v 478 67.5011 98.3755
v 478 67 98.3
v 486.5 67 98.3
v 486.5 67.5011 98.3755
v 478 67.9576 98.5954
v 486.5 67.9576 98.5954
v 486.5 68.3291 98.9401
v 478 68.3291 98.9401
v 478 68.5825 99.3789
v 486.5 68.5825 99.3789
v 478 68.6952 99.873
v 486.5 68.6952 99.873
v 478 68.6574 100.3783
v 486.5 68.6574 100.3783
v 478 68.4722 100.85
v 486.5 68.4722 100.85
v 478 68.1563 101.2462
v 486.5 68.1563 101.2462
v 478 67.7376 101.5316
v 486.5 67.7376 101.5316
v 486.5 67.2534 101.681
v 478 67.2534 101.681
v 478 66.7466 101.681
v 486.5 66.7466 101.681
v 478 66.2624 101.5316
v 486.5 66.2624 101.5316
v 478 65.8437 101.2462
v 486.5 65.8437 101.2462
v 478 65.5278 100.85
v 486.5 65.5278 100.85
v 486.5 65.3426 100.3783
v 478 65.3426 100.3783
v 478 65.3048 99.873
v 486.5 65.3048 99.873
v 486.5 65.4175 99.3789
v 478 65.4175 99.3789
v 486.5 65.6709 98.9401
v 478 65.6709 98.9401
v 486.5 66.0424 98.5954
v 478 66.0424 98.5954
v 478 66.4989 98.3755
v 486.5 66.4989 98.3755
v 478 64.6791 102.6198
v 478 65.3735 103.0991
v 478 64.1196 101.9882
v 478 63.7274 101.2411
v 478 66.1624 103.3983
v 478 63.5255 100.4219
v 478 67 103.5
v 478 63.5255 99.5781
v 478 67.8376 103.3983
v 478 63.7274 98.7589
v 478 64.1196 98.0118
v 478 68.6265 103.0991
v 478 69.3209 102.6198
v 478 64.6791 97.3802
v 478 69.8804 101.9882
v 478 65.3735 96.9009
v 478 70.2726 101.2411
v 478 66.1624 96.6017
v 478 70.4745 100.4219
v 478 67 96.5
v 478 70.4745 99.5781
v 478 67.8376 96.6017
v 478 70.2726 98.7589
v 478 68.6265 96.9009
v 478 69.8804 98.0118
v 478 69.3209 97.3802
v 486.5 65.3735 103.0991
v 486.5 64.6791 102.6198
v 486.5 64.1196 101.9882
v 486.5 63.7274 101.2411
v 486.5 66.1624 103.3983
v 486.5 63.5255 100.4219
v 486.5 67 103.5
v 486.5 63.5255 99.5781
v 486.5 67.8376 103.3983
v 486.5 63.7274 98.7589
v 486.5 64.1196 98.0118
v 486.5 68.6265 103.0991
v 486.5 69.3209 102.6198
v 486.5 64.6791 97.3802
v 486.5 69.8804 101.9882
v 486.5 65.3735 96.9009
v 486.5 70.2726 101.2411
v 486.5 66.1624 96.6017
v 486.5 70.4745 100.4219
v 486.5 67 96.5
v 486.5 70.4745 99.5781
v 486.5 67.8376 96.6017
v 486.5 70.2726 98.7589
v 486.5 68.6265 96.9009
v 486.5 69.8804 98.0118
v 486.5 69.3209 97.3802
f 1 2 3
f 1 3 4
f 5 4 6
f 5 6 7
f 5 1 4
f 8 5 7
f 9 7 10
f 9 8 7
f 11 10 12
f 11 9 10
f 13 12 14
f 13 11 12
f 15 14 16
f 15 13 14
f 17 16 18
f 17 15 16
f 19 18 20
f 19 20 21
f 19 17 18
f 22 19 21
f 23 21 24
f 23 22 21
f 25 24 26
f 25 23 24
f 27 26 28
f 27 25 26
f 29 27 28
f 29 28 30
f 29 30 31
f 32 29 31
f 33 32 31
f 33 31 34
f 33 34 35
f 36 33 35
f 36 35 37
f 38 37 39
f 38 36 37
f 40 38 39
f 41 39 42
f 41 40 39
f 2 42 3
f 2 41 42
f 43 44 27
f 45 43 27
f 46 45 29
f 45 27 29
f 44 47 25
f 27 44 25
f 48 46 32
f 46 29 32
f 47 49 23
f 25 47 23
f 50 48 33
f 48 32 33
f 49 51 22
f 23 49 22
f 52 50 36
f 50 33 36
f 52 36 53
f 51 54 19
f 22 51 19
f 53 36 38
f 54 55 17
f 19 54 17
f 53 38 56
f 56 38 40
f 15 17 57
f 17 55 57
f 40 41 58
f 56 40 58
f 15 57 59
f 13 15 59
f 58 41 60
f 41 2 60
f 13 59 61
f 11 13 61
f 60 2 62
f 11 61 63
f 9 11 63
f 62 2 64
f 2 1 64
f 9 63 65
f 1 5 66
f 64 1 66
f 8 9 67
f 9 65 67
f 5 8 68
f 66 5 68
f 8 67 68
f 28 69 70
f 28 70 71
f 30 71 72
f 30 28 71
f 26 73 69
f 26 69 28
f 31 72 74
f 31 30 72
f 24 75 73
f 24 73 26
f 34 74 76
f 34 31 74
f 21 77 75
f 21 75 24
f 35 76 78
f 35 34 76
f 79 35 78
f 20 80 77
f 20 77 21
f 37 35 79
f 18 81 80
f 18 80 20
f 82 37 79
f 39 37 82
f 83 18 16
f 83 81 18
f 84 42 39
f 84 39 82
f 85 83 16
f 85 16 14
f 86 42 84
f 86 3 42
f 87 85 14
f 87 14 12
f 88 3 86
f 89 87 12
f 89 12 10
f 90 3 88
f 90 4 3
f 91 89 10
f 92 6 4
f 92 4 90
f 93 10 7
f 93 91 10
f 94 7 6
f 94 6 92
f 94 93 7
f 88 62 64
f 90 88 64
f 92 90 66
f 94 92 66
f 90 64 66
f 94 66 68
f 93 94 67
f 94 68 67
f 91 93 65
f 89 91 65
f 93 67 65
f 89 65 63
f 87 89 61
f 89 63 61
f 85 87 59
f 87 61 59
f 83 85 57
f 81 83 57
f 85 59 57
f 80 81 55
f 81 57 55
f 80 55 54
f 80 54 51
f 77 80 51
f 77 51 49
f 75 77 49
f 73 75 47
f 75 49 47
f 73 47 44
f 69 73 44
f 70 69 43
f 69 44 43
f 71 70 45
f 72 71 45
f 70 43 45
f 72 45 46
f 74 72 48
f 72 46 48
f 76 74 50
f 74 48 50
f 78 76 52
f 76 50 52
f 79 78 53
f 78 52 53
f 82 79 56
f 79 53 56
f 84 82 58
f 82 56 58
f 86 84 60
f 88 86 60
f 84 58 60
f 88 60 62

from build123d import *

# Parameters (mm, degrees)
CYLINDER1393_R     = 1.7
CYLINDER1393_DEPTH = 8.5
CYLINDER1391_R     = 3.5
CYLINDER1391_DEPTH = 8.5


with BuildPart() as cylinder1393:
    # Cylinder1393 → Cylinder1393 (new body)
    with BuildSketch(Plane(origin=(436, 67, 100), x_dir=(0, 0, -1), z_dir=(1, 0, 0))):
        Circle(CYLINDER1393_R)
    extrude(amount=CYLINDER1393_DEPTH)


with BuildPart() as bucket_right_half_long_spacer:
    # Cylinder1391 → Cylinder1391 (new body)
    with BuildSketch(Plane(origin=(436, 67, 100), x_dir=(0, 0, -1), z_dir=(1, 0, 0))):
        Circle(CYLINDER1391_R)
    extrude(amount=CYLINDER1391_DEPTH)

    # Cut014358: cut Cylinder1393
    add(cylinder1393.part, mode=Mode.SUBTRACT)


with BuildPart() as bucket_right_half_long_spacer_1:
    # Cut014358 placement: moved
    add(bucket_right_half_long_spacer.part.moved(Location((42, 0, 0))))


solid = bucket_right_half_long_spacer_1.part
